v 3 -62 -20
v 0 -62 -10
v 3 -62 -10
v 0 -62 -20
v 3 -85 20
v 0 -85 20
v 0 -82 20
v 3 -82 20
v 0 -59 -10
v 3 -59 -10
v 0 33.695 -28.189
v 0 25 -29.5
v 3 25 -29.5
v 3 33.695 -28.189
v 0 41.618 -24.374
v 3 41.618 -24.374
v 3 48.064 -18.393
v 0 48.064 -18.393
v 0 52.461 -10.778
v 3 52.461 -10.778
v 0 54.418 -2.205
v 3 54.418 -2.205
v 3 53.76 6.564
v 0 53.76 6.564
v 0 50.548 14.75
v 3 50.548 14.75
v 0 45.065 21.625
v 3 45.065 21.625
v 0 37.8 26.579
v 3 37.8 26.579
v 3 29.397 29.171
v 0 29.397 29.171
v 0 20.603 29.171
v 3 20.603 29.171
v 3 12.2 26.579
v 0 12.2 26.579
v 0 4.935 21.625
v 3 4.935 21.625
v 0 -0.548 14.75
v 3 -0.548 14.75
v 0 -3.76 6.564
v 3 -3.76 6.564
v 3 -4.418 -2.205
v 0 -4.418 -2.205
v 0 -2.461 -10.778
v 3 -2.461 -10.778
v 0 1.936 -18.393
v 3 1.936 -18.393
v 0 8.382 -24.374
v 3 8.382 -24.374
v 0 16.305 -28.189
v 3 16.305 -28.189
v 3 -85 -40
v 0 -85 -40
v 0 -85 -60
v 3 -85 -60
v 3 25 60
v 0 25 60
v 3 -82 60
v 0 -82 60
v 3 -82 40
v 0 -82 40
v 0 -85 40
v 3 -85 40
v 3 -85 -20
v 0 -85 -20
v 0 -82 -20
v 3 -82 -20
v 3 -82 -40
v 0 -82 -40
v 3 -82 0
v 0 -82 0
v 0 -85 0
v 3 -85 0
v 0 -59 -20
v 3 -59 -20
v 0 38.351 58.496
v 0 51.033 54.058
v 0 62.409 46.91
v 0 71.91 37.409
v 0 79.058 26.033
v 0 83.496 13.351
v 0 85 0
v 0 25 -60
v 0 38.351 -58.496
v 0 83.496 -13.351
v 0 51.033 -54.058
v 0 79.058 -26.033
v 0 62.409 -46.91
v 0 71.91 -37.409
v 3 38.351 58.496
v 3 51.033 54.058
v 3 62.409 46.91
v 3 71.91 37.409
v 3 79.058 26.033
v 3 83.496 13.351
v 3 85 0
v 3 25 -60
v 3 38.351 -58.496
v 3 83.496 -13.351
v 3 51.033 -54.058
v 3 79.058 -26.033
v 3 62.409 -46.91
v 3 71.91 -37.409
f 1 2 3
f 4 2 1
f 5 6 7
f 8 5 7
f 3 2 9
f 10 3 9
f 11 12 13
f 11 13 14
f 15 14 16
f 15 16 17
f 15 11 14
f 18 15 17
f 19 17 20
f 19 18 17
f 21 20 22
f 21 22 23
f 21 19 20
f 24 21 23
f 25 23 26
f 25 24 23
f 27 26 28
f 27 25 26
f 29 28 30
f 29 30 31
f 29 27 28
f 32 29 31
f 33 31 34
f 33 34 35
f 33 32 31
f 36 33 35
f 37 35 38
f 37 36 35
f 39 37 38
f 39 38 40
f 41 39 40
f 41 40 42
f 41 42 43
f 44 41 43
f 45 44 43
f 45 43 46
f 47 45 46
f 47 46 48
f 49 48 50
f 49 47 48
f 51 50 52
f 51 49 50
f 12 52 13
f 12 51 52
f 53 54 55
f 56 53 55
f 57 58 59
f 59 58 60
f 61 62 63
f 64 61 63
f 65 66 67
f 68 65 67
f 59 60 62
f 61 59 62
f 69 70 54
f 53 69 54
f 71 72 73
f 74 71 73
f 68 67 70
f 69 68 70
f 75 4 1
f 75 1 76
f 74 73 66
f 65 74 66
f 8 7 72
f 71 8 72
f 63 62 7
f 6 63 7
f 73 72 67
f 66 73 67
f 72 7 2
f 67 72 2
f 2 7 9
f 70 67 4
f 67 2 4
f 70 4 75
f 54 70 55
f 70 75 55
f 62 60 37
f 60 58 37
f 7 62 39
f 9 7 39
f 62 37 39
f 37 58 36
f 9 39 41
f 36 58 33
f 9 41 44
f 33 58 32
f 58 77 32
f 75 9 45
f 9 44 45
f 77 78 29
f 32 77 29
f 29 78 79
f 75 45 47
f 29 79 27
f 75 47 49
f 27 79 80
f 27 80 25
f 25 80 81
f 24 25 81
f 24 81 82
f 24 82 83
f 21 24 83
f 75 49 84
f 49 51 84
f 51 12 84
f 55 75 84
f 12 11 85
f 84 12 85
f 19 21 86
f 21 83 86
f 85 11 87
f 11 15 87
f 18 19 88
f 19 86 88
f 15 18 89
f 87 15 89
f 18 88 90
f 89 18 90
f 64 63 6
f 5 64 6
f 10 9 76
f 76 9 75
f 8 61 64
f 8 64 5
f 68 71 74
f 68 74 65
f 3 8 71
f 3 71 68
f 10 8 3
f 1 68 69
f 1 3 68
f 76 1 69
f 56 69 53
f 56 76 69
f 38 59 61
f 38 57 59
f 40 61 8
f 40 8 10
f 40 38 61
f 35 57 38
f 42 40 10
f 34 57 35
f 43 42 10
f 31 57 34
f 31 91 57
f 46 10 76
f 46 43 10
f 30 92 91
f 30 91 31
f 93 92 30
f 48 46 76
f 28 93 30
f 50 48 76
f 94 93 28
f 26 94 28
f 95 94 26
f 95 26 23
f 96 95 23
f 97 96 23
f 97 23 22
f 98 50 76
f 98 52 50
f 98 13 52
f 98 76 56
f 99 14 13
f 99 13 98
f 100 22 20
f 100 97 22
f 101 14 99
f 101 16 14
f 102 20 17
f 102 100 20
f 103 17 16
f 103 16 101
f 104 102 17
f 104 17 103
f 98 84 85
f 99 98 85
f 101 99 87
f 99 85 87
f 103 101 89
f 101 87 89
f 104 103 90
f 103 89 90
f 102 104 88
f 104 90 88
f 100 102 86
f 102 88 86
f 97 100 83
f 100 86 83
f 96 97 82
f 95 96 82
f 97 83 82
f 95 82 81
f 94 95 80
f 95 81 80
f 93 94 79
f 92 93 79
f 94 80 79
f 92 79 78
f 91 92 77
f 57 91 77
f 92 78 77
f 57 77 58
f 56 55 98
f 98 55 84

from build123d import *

# Parameters (mm, degrees)
CROQUIS1_R              = 29.5
CROQUIS1_W              = 10
CROQUIS1_H              = 3
SALIENTE_EXTRUIR1_DEPTH = 3


with BuildPart() as part:
    # Croquis1 → Saliente-Extruir1 (new body)
    with BuildSketch(Plane(origin=(0, 0, 0), x_dir=(0, 0, -1), z_dir=(1, 0, 0))):
        with BuildLine():
            Line((-60, -82), (-40, -82))
            Line((-40, -82), (-40, -85))
            Line((-40, -85), (-20, -85))
            Line((-20, -85), (-20, -82))
            Line((-20, -82), (0, -82))
            Line((0, -82), (0, -85))
            Line((0, -85), (20, -85))
            Line((20, -85), (20, -82))
            Line((20, -82), (40, -82))
            Line((40, -82), (40, -85))
            Line((40, -85), (60, -85))
            Line((60, -85), (60, 25))
            ThreePointArc((60, 25), (0, 85), (-60, 25))
            Line((-60, 25), (-60, -82))
        make_face()
        with Locations((0, 25)):
            Circle(CROQUIS1_R, mode=Mode.SUBTRACT)
        with Locations((15, -60.5)):
            Rectangle(CROQUIS1_W, CROQUIS1_H, mode=Mode.SUBTRACT)
    extrude(amount=SALIENTE_EXTRUIR1_DEPTH)


solid = part.part
